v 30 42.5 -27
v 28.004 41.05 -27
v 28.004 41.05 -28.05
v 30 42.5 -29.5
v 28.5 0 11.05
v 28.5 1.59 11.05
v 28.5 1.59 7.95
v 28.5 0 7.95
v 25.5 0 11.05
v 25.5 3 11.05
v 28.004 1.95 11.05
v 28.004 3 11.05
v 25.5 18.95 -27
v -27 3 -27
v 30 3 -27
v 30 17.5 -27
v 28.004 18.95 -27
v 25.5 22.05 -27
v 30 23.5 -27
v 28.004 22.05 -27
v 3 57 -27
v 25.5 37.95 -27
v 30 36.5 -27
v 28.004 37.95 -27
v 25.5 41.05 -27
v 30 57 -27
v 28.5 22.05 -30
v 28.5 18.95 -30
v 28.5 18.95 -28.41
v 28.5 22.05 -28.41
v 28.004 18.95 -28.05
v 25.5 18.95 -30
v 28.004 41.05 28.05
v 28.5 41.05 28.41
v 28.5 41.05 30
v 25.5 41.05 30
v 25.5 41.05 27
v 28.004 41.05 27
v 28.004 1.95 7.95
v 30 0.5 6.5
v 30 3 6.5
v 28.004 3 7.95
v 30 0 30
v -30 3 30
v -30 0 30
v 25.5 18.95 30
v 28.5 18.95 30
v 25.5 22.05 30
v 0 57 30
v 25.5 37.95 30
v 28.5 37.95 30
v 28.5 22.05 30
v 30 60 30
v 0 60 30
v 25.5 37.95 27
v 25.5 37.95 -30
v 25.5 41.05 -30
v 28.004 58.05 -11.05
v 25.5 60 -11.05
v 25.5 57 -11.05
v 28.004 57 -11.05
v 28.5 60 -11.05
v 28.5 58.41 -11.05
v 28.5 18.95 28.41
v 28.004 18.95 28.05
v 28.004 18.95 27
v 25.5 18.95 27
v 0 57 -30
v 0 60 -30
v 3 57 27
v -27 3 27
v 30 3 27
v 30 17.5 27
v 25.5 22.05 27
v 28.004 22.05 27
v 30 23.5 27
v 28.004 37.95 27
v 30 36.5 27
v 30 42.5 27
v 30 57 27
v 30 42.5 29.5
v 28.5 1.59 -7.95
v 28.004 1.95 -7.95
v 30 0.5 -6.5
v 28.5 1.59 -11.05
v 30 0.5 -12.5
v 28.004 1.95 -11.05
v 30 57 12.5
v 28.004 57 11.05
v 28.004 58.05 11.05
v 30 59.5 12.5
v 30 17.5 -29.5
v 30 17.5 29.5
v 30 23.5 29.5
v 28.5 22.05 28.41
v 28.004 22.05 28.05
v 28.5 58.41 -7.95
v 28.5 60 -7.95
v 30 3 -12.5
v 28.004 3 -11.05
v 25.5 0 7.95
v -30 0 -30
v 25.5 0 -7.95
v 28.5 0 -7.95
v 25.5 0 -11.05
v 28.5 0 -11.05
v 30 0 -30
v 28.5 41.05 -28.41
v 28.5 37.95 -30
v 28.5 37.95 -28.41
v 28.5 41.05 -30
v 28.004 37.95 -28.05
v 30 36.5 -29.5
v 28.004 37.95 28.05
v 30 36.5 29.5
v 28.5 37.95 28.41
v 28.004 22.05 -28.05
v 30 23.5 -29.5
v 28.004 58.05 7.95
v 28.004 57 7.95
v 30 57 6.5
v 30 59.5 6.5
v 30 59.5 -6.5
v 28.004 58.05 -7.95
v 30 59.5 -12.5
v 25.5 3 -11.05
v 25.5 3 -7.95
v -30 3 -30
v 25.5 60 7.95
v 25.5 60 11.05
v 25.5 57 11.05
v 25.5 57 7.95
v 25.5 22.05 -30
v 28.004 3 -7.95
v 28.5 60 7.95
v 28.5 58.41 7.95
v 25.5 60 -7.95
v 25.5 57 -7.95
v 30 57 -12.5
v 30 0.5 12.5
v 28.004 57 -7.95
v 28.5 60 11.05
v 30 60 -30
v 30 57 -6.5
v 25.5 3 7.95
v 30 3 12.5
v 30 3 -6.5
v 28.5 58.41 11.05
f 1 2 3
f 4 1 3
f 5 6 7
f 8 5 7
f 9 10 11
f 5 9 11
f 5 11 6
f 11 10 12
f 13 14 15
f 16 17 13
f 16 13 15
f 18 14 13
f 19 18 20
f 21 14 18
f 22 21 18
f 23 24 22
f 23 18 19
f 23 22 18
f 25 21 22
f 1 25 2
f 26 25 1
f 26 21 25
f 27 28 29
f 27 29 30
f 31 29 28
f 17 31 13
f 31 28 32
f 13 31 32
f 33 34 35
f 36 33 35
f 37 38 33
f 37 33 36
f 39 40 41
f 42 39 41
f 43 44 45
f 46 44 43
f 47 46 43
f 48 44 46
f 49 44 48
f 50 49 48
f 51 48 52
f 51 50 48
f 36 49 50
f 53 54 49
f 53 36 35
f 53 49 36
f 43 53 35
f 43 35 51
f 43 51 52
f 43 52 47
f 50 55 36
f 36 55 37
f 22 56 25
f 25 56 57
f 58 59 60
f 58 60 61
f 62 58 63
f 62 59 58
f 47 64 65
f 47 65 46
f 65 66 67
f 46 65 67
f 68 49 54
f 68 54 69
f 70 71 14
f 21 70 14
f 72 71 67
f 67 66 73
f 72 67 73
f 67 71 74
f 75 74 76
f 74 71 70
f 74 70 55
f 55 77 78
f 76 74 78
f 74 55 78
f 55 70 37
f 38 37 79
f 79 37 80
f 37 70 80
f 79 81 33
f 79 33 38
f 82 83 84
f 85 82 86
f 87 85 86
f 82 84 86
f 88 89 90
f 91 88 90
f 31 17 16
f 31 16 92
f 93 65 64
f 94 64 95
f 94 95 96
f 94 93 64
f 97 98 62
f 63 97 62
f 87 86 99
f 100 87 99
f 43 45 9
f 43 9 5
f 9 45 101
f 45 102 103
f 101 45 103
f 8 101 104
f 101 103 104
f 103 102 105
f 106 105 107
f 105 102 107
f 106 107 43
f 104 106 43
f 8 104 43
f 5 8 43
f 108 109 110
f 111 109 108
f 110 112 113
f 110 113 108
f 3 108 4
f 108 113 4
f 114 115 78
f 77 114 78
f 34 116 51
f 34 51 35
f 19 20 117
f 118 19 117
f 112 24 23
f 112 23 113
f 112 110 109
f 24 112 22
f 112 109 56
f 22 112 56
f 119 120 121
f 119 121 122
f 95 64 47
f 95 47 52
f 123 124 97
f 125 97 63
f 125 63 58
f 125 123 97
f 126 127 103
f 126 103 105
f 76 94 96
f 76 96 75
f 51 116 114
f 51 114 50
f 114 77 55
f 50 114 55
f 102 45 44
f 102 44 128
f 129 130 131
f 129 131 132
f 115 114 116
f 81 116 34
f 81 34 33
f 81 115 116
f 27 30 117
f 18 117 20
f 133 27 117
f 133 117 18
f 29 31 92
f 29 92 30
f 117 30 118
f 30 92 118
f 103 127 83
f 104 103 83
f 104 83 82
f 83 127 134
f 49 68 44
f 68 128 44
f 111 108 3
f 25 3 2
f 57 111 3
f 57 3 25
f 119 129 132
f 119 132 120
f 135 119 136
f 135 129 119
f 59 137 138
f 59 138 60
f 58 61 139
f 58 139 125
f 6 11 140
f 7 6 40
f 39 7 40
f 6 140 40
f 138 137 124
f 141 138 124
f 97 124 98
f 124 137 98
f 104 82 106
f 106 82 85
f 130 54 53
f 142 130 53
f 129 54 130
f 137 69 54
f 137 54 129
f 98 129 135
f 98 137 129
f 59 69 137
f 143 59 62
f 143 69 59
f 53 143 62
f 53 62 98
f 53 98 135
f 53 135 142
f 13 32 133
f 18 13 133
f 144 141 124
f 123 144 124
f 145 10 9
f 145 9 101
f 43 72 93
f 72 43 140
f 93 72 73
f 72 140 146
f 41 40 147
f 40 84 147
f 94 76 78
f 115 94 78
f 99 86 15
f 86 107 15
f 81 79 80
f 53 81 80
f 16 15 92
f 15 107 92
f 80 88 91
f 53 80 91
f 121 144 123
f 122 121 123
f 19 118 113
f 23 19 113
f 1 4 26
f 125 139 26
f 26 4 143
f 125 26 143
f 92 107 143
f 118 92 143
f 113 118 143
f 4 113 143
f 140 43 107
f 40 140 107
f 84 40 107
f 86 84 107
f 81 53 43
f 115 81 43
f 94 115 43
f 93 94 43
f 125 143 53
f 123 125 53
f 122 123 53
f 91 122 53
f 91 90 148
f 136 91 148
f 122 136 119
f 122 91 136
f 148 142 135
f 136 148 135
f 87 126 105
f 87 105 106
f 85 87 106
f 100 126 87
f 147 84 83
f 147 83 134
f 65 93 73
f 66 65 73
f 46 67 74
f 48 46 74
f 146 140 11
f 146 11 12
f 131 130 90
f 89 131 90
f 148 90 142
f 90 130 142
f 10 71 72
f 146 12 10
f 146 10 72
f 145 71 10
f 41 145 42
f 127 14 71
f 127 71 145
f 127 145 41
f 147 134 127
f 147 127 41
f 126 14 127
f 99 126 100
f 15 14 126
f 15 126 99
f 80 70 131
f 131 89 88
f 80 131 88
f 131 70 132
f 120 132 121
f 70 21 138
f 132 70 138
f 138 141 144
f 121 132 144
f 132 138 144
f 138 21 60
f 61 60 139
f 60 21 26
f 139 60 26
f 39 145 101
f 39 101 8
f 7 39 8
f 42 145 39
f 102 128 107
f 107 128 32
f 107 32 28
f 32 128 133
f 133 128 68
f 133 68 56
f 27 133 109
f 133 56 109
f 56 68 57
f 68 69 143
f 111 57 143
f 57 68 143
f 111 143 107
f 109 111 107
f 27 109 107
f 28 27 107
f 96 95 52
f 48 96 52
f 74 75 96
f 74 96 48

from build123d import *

# Parameters (mm, degrees)
SKETCH_1_W                    = 60
SKETCH_1_H                    = 60
EXTRUDE_1_DEPTH               = 3
SKETCH_2_W                    = 30
SKETCH_2_H                    = 60
EXTRUDE_2_DEPTH               = 3
EXTRUDE_3_DEPTH               = 3
EXTRUDE_4_DEPTH               = 3
SKETCH_8_W                    = 3
SKETCH_8_H                    = 3.1
CUT_EXTRUDE_2_DEPTH           = 91.000000167
SKETCH_9_W                    = 3
SKETCH_9_H                    = 3.1
CUT_EXTRUDE_3_DEPTH           = 74.484692447
SKETCH_7_W                    = 6
SKETCH_7_H                    = 5
CUT_EXTRUDE_1_DEPTH           = 2
CUT_EXTRUDE_1_DRAFT           = -36
SKETCH_7_W_2                  = 5
SKETCH_7_H_2                  = 6
CUT_EXTRUDE_1_PROFILE_2_DEPTH = 2
CUT_EXTRUDE_1_PROFILE_2_DRAFT = -36
CUT_EXTRUDE_1_PROFILE_3_DEPTH = 2
CUT_EXTRUDE_1_PROFILE_3_DRAFT = -36
CUT_EXTRUDE_1_PROFILE_4_DEPTH = 2
CUT_EXTRUDE_1_PROFILE_4_DRAFT = -36
CUT_EXTRUDE_1_PROFILE_5_DEPTH = 2
CUT_EXTRUDE_1_PROFILE_5_DRAFT = -36
CUT_EXTRUDE_1_PROFILE_6_DEPTH = 2
CUT_EXTRUDE_1_PROFILE_6_DRAFT = -36
CUT_EXTRUDE_1_PROFILE_7_DEPTH = 2
CUT_EXTRUDE_1_PROFILE_7_DRAFT = -36
CUT_EXTRUDE_1_PROFILE_8_DEPTH = 2
CUT_EXTRUDE_1_PROFILE_8_DRAFT = -36


with BuildPart() as part:
    # 草图1 → 凸台-拉伸1 (new body)
    with BuildSketch(Plane(origin=(0, 0, 0), x_dir=(1, 0, 0), z_dir=(0, 1, 0))):
        Rectangle(SKETCH_1_W, SKETCH_1_H)
    extrude(amount=EXTRUDE_1_DEPTH)



with BuildPart() as body_2:
    # 草图2 → 凸台-拉伸2 (new body)
    with BuildSketch(Plane(origin=(0, 57, 0), x_dir=(1, 0, 0), z_dir=(0, 1, 0))):
        with Locations((15, 0)):
            Rectangle(SKETCH_2_W, SKETCH_2_H)
    extrude(amount=EXTRUDE_2_DEPTH)


with BuildPart() as part_1:
    add(part.part)

    add(body_2.part)  # 放样1 merges body 2
    # 草图3 → 放样1 section 0
    with BuildSketch(Plane.XZ.offset(-57)):
        with BuildLine():
            Line((0, 30), (3, 30))
            Line((3, 30), (3, -30))
            Line((3, -30), (0, -30))
            Line((0, -30), (0, 30))
        make_face()
    # 草图4 → 放样1 section 1
    with BuildSketch(Plane(origin=(0, 3, 0), x_dir=(1, 0, 0), z_dir=(0, 1, 0))):
        with BuildLine():
            Line((-30, 30), (-27, 30))
            Line((-27, 30), (-27, -30))
            Line((-27, -30), (-30, -30))
            Line((-30, -30), (-30, 30))
        make_face()
    loft()

    # 草图5 → 凸台-拉伸3 (add)
    with BuildSketch(Plane.XY.offset(30)):
        Polygon((30, 57), (3, 57), (-27, 3), (30, 3), align=None)
    extrude(amount=-EXTRUDE_3_DEPTH)

    # 草图6 → 凸台-拉伸4 (add)
    with BuildSketch(Plane(origin=(0, 0, -30), x_dir=(-1, 0, 0), z_dir=(0, 0, -1))):
        Polygon((-30, 57), (-3, 57), (27, 3), (-30, 3), align=None)
    extrude(amount=-EXTRUDE_4_DEPTH)

    # 草图8 → 切除-拉伸2 (cut, through all)
    with BuildSketch(Plane(origin=(0, 0, -30), x_dir=(-1, 0, 0), z_dir=(0, 0, -1))):
        with Locations((-27, 39.5)):
            Rectangle(SKETCH_8_W, SKETCH_8_H)
        with Locations((-27, 20.5)):
            Rectangle(SKETCH_8_W, SKETCH_8_H)
    extrude(amount=-CUT_EXTRUDE_2_DEPTH, mode=Mode.SUBTRACT)

    # 草图9 → 切除-拉伸3 (cut, through all)
    with BuildSketch(Plane(origin=(0, 60, 0), x_dir=(1, 0, 0), z_dir=(0, 1, 0))):
        with Locations((27, 9.5)):
            Rectangle(SKETCH_9_W, SKETCH_9_H)
        with Locations((27, -9.5)):
            Rectangle(SKETCH_9_W, SKETCH_9_H)
    extrude(amount=-CUT_EXTRUDE_3_DEPTH, mode=Mode.SUBTRACT)


with BuildPart() as cut_extrude_1_tool:
    # 草图7 → 切除-拉伸1 (with draft: the straight prism first)
    with BuildSketch(Plane(origin=(30, 0, 0), x_dir=(0, 0, -1), z_dir=(1, 0, 0))):
        with Locations((9.5, 3)):
            Rectangle(SKETCH_7_W, SKETCH_7_H)
    extrude(amount=-CUT_EXTRUDE_1_DEPTH)
    # 切除-拉伸1: the draft: its side faces are tilted about the plane it starts from
    cut_extrude_1_sides = [cut_extrude_1_tool.faces().sort_by_distance(p)[0] for p in [
        (29, 3, -6.5),
        (29, 0.5, -9.5),
        (29, 3, -12.5),
        (29, 5.5, -9.5),
    ]]
    draft(cut_extrude_1_sides, Plane(origin=(30, 0, 0), x_dir=(0, 0, -1), z_dir=(1, 0, 0)), CUT_EXTRUDE_1_DRAFT)


with BuildPart() as part_2:
    add(part_1.part)

    # 切除-拉伸1: cut by cut_extrude_1_tool
    add(cut_extrude_1_tool.part, mode=Mode.SUBTRACT)


with BuildPart() as cut_extrude_1_profile_2_tool:
    # 草图7 → 切除-拉伸1 profile 2 (with draft: the straight prism first)
    with BuildSketch(Plane(origin=(30, 0, 0), x_dir=(0, 0, -1), z_dir=(1, 0, 0))):
        with Locations((27, 39.5)):
            Rectangle(SKETCH_7_W_2, SKETCH_7_H_2)
    extrude(amount=-CUT_EXTRUDE_1_PROFILE_2_DEPTH)
    # 切除-拉伸1 profile 2: the draft: its side faces are tilted about the plane it starts from
    cut_extrude_1_profile_2_sides = [cut_extrude_1_profile_2_tool.faces().sort_by_distance(p)[0] for p in [
        (29, 36.5, -27),
        (29, 39.5, -29.5),
        (29, 42.5, -27),
        (29, 39.5, -24.5),
    ]]
    draft(cut_extrude_1_profile_2_sides, Plane(origin=(30, 0, 0), x_dir=(0, 0, -1), z_dir=(1, 0, 0)), CUT_EXTRUDE_1_PROFILE_2_DRAFT)


with BuildPart() as part_3:
    add(part_2.part)

    # 切除-拉伸1 profile 2: cut by cut_extrude_1_profile_2_tool
    add(cut_extrude_1_profile_2_tool.part, mode=Mode.SUBTRACT)


with BuildPart() as cut_extrude_1_profile_3_tool:
    # 草图7 → 切除-拉伸1 profile 3 (with draft: the straight prism first)
    with BuildSketch(Plane(origin=(30, 0, 0), x_dir=(0, 0, -1), z_dir=(1, 0, 0))):
        with Locations((27, 20.5)):
            Rectangle(SKETCH_7_W_2, SKETCH_7_H_2)
    extrude(amount=-CUT_EXTRUDE_1_PROFILE_3_DEPTH)
    # 切除-拉伸1 profile 3: the draft: its side faces are tilted about the plane it starts from
    cut_extrude_1_profile_3_sides = [cut_extrude_1_profile_3_tool.faces().sort_by_distance(p)[0] for p in [
        (29, 23.5, -27),
        (29, 20.5, -24.5),
        (29, 17.5, -27),
        (29, 20.5, -29.5),
    ]]
    draft(cut_extrude_1_profile_3_sides, Plane(origin=(30, 0, 0), x_dir=(0, 0, -1), z_dir=(1, 0, 0)), CUT_EXTRUDE_1_PROFILE_3_DRAFT)


with BuildPart() as part_4:
    add(part_3.part)

    # 切除-拉伸1 profile 3: cut by cut_extrude_1_profile_3_tool
    add(cut_extrude_1_profile_3_tool.part, mode=Mode.SUBTRACT)


with BuildPart() as cut_extrude_1_profile_4_tool:
    # 草图7 → 切除-拉伸1 profile 4 (with draft: the straight prism first)
    with BuildSketch(Plane(origin=(30, 0, 0), x_dir=(0, 0, -1), z_dir=(1, 0, 0))):
        with Locations((-9.5, 3)):
            Rectangle(SKETCH_7_W, SKETCH_7_H)
    extrude(amount=-CUT_EXTRUDE_1_PROFILE_4_DEPTH)
    # 切除-拉伸1 profile 4: the draft: its side faces are tilted about the plane it starts from
    cut_extrude_1_profile_4_sides = [cut_extrude_1_profile_4_tool.faces().sort_by_distance(p)[0] for p in [
        (29, 3, 6.5),
        (29, 5.5, 9.5),
        (29, 3, 12.5),
        (29, 0.5, 9.5),
    ]]
    draft(cut_extrude_1_profile_4_sides, Plane(origin=(30, 0, 0), x_dir=(0, 0, -1), z_dir=(1, 0, 0)), CUT_EXTRUDE_1_PROFILE_4_DRAFT)


with BuildPart() as part_5:
    add(part_4.part)

    # 切除-拉伸1 profile 4: cut by cut_extrude_1_profile_4_tool
    add(cut_extrude_1_profile_4_tool.part, mode=Mode.SUBTRACT)


with BuildPart() as cut_extrude_1_profile_5_tool:
    # 草图7 → 切除-拉伸1 profile 5 (with draft: the straight prism first)
    with BuildSketch(Plane(origin=(30, 0, 0), x_dir=(0, 0, -1), z_dir=(1, 0, 0))):
        with Locations((-27, 20.5)):
            Rectangle(SKETCH_7_W_2, SKETCH_7_H_2)
    extrude(amount=-CUT_EXTRUDE_1_PROFILE_5_DEPTH)
    # 切除-拉伸1 profile 5: the draft: its side faces are tilted about the plane it starts from
    cut_extrude_1_profile_5_sides = [cut_extrude_1_profile_5_tool.faces().sort_by_distance(p)[0] for p in [
        (29, 23.5, 27),
        (29, 20.5, 29.5),
        (29, 17.5, 27),
        (29, 20.5, 24.5),
    ]]
    draft(cut_extrude_1_profile_5_sides, Plane(origin=(30, 0, 0), x_dir=(0, 0, -1), z_dir=(1, 0, 0)), CUT_EXTRUDE_1_PROFILE_5_DRAFT)


with BuildPart() as part_6:
    add(part_5.part)

    # 切除-拉伸1 profile 5: cut by cut_extrude_1_profile_5_tool
    add(cut_extrude_1_profile_5_tool.part, mode=Mode.SUBTRACT)


with BuildPart() as cut_extrude_1_profile_6_tool:
    # 草图7 → 切除-拉伸1 profile 6 (with draft: the straight prism first)
    with BuildSketch(Plane(origin=(30, 0, 0), x_dir=(0, 0, -1), z_dir=(1, 0, 0))):
        with Locations((-27, 39.5)):
            Rectangle(SKETCH_7_W_2, SKETCH_7_H_2)
    extrude(amount=-CUT_EXTRUDE_1_PROFILE_6_DEPTH)
    # 切除-拉伸1 profile 6: the draft: its side faces are tilted about the plane it starts from
    cut_extrude_1_profile_6_sides = [cut_extrude_1_profile_6_tool.faces().sort_by_distance(p)[0] for p in [
        (29, 36.5, 27),
        (29, 39.5, 24.5),
        (29, 42.5, 27),
        (29, 39.5, 29.5),
    ]]
    draft(cut_extrude_1_profile_6_sides, Plane(origin=(30, 0, 0), x_dir=(0, 0, -1), z_dir=(1, 0, 0)), CUT_EXTRUDE_1_PROFILE_6_DRAFT)


with BuildPart() as part_7:
    add(part_6.part)

    # 切除-拉伸1 profile 6: cut by cut_extrude_1_profile_6_tool
    add(cut_extrude_1_profile_6_tool.part, mode=Mode.SUBTRACT)


with BuildPart() as cut_extrude_1_profile_7_tool:
    # 草图7 → 切除-拉伸1 profile 7 (with draft: the straight prism first)
    with BuildSketch(Plane(origin=(30, 0, 0), x_dir=(0, 0, -1), z_dir=(1, 0, 0))):
        with Locations((-9.5, 57)):
            Rectangle(SKETCH_7_W, SKETCH_7_H)
    extrude(amount=-CUT_EXTRUDE_1_PROFILE_7_DEPTH)
    # 切除-拉伸1 profile 7: the draft: its side faces are tilted about the plane it starts from
    cut_extrude_1_profile_7_sides = [cut_extrude_1_profile_7_tool.faces().sort_by_distance(p)[0] for p in [
        (29, 57, 6.5),
        (29, 59.5, 9.5),
        (29, 57, 12.5),
        (29, 54.5, 9.5),
    ]]
    draft(cut_extrude_1_profile_7_sides, Plane(origin=(30, 0, 0), x_dir=(0, 0, -1), z_dir=(1, 0, 0)), CUT_EXTRUDE_1_PROFILE_7_DRAFT)


with BuildPart() as part_8:
    add(part_7.part)

    # 切除-拉伸1 profile 7: cut by cut_extrude_1_profile_7_tool
    add(cut_extrude_1_profile_7_tool.part, mode=Mode.SUBTRACT)


with BuildPart() as cut_extrude_1_profile_8_tool:
    # 草图7 → 切除-拉伸1 profile 8 (with draft: the straight prism first)
    with BuildSketch(Plane(origin=(30, 0, 0), x_dir=(0, 0, -1), z_dir=(1, 0, 0))):
        with Locations((9.5, 57)):
            Rectangle(SKETCH_7_W, SKETCH_7_H)
    extrude(amount=-CUT_EXTRUDE_1_PROFILE_8_DEPTH)
    # 切除-拉伸1 profile 8: the draft: its side faces are tilted about the plane it starts from
    cut_extrude_1_profile_8_sides = [cut_extrude_1_profile_8_tool.faces().sort_by_distance(p)[0] for p in [
        (29, 57, -6.5),
        (29, 54.5, -9.5),
        (29, 57, -12.5),
        (29, 59.5, -9.5),
    ]]
    draft(cut_extrude_1_profile_8_sides, Plane(origin=(30, 0, 0), x_dir=(0, 0, -1), z_dir=(1, 0, 0)), CUT_EXTRUDE_1_PROFILE_8_DRAFT)


with BuildPart() as part_9:
    add(part_8.part)

    # 切除-拉伸1 profile 8: cut by cut_extrude_1_profile_8_tool
    add(cut_extrude_1_profile_8_tool.part, mode=Mode.SUBTRACT)


solid = part_9.part
